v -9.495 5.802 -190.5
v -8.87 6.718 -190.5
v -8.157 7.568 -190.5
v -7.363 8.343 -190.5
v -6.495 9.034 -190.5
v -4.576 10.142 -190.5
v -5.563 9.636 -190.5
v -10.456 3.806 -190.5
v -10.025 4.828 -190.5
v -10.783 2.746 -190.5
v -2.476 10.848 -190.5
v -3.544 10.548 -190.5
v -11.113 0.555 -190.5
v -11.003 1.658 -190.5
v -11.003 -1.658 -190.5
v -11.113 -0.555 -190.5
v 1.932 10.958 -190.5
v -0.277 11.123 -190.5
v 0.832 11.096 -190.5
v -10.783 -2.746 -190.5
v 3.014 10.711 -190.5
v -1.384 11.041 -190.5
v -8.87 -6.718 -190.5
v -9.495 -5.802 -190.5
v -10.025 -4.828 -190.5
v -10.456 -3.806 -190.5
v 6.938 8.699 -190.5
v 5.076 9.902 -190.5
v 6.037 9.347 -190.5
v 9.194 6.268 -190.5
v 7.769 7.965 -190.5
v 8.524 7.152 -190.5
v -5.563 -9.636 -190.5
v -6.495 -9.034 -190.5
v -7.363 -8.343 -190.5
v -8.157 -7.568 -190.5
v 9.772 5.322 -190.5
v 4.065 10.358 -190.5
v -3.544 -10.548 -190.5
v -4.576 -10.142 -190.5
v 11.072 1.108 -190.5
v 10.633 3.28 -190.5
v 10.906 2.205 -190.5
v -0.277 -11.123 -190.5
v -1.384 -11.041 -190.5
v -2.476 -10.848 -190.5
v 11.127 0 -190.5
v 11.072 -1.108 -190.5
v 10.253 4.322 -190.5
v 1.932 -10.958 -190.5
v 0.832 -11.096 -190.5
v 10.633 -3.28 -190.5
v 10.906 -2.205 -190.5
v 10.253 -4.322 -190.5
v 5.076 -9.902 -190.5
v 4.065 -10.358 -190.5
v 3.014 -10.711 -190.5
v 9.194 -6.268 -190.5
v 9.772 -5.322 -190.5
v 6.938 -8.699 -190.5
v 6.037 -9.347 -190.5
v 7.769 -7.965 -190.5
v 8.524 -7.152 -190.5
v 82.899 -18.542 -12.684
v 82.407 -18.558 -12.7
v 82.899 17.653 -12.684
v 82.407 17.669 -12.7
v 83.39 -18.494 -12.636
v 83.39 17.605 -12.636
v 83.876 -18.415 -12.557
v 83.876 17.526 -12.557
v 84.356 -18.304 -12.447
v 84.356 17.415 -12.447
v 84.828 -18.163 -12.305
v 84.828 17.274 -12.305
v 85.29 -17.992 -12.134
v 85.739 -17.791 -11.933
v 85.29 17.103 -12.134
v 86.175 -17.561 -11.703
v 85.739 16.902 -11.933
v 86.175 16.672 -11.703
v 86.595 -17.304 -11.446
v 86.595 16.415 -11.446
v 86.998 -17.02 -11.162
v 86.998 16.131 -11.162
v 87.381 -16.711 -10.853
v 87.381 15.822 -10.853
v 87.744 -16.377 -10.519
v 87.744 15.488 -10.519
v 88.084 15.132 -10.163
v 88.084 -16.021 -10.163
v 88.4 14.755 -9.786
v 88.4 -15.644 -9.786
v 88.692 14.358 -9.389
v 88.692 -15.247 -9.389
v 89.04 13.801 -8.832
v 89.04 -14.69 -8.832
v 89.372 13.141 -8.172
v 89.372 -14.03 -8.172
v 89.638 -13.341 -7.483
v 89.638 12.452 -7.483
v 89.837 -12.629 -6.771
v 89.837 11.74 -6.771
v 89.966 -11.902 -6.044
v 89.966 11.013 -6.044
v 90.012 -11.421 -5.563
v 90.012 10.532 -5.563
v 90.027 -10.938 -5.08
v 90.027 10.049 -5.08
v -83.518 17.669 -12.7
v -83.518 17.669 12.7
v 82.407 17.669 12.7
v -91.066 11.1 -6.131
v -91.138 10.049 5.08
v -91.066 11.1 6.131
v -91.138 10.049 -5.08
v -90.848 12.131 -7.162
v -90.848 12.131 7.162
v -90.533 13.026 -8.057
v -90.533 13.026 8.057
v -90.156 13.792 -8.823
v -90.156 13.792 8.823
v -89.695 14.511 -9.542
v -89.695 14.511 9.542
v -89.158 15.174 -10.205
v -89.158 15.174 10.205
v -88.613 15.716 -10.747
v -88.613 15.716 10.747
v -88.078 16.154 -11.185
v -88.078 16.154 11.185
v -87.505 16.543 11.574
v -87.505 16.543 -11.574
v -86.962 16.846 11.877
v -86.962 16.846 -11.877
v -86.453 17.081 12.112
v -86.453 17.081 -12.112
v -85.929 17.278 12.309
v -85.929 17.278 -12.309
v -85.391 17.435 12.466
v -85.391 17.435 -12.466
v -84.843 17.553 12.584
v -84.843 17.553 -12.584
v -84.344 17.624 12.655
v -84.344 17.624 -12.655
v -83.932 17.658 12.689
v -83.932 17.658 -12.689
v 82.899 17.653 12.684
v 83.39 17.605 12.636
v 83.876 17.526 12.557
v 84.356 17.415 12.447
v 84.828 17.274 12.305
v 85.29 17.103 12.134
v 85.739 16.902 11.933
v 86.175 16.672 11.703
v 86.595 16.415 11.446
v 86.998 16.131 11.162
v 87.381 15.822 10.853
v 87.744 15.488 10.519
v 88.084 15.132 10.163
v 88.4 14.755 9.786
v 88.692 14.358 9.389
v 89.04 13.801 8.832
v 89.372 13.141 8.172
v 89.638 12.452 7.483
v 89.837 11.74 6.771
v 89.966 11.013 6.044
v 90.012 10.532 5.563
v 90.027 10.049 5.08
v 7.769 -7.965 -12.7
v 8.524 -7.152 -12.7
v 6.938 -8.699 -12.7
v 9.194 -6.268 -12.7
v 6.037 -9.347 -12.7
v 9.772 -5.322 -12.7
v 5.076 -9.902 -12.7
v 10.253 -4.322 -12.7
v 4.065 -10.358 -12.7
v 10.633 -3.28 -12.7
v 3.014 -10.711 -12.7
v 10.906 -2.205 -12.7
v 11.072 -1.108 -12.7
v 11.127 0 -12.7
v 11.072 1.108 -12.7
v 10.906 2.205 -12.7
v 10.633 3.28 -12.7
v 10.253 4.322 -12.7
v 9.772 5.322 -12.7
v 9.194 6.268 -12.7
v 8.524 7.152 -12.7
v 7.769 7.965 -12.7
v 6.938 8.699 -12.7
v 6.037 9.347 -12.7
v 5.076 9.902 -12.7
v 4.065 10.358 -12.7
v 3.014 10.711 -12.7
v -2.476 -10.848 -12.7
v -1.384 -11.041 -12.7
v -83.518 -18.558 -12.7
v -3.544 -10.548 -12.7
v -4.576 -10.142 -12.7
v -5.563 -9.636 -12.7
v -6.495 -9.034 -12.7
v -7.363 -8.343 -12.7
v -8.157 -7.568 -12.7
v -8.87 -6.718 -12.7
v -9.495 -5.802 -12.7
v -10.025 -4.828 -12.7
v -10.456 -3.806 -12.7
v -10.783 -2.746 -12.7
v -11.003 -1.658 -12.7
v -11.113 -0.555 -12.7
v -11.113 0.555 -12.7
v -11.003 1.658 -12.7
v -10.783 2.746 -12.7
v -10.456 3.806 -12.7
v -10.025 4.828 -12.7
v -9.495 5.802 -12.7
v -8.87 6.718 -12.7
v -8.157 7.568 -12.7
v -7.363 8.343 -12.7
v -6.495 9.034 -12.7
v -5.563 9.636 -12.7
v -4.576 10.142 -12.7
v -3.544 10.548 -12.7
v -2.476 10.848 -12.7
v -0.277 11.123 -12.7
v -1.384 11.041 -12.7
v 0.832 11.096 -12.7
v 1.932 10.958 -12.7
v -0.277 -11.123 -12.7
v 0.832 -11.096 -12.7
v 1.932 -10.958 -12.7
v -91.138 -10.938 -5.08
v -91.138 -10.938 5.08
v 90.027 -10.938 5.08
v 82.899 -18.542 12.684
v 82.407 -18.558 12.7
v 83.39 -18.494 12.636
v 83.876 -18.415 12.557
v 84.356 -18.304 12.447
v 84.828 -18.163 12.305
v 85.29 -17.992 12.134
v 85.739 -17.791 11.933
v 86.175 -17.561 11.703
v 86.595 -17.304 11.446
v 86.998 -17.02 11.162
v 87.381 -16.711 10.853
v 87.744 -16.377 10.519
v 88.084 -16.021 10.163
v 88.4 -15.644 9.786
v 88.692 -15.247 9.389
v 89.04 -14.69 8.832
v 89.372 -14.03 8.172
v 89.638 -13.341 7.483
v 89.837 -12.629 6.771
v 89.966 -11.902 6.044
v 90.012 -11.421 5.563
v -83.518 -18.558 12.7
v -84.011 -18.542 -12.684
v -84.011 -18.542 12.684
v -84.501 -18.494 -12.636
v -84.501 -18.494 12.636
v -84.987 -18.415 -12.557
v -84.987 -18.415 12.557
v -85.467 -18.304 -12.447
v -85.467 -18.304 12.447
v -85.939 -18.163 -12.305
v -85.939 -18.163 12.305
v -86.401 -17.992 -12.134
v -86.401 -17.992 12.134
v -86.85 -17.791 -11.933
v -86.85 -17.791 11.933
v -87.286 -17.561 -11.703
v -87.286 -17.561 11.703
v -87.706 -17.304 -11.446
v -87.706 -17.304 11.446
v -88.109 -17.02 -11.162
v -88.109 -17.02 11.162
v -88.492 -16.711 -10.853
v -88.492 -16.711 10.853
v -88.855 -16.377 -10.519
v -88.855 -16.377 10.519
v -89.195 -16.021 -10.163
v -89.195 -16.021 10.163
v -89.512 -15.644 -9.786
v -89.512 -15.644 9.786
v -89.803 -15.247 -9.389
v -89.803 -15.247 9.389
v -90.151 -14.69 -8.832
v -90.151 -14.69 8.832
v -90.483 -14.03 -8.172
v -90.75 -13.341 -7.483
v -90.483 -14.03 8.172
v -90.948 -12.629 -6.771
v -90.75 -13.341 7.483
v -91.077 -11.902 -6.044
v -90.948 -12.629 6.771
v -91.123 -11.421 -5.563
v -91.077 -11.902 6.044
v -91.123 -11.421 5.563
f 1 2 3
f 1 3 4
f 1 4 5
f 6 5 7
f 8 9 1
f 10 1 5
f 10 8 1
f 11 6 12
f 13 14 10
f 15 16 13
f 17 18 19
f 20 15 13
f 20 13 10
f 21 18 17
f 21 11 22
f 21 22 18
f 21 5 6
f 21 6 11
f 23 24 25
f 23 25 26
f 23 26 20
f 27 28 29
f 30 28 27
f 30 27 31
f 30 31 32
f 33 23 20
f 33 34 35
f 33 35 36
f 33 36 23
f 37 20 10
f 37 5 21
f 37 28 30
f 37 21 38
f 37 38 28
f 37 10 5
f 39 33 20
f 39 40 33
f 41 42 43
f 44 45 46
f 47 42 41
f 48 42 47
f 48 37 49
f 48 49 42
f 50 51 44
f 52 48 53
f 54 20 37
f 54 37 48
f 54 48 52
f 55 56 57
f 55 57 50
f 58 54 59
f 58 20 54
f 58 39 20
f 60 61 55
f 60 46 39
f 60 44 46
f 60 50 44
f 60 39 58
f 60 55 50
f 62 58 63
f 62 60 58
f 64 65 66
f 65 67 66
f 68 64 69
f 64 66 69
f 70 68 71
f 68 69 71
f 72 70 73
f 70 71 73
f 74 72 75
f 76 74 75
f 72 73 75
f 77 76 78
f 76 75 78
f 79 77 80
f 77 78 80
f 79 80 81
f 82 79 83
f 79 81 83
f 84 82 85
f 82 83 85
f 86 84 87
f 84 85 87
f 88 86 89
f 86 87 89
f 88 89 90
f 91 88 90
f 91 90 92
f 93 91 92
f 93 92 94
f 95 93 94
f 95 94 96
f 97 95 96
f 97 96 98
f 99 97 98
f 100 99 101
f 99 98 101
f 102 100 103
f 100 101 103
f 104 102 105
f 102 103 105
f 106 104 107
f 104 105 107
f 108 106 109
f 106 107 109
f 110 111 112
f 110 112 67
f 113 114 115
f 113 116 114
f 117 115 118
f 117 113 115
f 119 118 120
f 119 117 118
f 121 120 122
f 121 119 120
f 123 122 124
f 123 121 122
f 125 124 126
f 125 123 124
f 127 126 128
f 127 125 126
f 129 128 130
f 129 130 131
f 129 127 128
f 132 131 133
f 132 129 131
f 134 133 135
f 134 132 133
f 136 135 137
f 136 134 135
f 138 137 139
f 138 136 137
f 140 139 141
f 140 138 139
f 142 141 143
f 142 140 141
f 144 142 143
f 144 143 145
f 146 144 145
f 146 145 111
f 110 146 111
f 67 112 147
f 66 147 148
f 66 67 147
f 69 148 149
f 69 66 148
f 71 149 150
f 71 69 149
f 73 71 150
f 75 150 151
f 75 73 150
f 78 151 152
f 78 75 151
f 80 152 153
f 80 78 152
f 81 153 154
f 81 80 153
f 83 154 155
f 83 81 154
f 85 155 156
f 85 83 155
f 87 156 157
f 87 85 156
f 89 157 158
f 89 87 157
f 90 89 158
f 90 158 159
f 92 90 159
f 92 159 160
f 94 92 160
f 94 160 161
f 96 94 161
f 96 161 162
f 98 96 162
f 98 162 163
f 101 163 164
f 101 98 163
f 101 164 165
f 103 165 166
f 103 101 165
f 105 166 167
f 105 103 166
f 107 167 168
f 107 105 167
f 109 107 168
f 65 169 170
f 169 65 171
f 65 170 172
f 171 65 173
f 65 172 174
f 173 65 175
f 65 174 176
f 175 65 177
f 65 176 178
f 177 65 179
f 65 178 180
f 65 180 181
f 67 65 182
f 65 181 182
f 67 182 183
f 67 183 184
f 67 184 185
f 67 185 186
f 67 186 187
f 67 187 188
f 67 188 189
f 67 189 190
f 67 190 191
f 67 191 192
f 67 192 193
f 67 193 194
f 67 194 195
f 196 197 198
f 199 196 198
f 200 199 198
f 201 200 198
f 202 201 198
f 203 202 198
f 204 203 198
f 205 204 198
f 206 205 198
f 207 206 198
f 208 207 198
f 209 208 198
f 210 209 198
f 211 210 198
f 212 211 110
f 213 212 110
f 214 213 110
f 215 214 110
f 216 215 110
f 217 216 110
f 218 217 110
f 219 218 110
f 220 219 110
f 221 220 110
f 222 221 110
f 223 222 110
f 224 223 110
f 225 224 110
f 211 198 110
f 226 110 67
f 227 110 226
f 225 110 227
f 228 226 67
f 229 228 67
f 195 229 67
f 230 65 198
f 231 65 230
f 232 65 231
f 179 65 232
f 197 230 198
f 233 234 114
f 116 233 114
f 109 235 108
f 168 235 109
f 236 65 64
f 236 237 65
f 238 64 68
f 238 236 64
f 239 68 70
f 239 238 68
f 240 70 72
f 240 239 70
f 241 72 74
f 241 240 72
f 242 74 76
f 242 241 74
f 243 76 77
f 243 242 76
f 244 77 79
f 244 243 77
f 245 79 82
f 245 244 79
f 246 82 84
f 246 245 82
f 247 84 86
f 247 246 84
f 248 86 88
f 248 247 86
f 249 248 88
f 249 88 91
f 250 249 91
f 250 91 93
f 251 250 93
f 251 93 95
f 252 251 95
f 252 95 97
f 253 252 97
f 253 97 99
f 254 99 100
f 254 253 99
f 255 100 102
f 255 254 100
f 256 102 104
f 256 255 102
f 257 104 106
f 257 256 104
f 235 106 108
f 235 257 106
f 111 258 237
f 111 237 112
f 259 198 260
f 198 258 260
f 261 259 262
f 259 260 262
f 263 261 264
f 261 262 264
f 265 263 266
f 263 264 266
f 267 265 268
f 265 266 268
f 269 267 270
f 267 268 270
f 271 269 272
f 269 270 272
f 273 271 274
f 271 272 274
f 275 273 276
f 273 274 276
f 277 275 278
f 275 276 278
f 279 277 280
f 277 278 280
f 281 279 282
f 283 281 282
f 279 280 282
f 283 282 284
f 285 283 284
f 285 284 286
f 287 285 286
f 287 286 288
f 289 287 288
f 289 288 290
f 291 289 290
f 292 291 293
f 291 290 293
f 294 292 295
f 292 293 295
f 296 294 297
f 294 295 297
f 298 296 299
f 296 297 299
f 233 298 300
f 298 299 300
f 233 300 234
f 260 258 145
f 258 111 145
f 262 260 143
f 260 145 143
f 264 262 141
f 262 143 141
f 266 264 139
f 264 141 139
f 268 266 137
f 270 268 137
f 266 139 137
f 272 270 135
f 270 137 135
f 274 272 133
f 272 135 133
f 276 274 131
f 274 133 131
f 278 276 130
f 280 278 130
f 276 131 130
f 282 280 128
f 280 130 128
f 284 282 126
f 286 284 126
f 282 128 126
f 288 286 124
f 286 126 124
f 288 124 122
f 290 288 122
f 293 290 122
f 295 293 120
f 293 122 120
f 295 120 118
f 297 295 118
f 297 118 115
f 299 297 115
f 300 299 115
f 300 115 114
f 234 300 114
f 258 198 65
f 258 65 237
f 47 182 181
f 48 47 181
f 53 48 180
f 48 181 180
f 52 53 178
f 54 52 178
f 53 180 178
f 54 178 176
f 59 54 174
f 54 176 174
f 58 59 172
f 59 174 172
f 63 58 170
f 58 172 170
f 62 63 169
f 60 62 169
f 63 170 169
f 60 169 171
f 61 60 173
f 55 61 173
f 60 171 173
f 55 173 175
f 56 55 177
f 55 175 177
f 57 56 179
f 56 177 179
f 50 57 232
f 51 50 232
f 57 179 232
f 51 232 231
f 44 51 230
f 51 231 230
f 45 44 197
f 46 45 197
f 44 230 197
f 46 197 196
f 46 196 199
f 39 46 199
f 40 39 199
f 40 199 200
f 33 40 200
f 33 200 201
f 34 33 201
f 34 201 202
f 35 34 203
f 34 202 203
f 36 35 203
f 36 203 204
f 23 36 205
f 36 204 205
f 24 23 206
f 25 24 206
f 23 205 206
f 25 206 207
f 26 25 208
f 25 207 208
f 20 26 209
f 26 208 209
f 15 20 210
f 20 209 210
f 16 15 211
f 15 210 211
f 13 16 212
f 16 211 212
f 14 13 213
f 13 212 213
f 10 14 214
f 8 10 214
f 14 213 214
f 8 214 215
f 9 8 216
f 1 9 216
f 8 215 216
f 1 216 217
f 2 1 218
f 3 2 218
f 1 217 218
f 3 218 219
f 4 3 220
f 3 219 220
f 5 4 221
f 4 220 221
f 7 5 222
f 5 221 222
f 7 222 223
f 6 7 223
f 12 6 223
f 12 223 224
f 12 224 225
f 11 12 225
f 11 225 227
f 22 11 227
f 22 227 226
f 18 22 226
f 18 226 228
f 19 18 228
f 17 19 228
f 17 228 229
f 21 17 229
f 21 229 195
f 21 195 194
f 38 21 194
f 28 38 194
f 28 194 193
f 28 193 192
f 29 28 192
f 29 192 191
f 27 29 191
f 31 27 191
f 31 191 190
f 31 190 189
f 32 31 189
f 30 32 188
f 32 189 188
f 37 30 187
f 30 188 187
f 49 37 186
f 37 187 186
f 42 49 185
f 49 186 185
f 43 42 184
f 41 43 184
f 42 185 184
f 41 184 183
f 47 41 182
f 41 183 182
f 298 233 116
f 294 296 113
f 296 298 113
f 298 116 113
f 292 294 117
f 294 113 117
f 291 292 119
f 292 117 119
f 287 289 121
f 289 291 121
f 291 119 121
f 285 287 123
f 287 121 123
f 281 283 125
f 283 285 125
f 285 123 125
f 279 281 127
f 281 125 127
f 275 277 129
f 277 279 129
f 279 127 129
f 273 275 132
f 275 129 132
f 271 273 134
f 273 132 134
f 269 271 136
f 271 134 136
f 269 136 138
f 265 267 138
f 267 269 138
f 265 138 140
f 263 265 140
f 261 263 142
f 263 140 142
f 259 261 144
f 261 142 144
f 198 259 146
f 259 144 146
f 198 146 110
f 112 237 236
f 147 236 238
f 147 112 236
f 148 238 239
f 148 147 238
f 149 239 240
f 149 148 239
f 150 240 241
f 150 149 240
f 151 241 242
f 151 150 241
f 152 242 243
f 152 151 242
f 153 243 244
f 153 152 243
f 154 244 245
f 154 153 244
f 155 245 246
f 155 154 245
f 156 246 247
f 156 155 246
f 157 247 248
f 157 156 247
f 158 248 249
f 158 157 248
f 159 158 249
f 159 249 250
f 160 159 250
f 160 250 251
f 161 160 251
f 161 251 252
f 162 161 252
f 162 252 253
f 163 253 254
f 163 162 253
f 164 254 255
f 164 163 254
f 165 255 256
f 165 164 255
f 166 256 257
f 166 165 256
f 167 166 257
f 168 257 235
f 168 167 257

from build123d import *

# Parameters (mm, degrees)
F0_W     = 79.5655027032
F0_H     = 36.2267494202
F1_DEPTH = 12.7
F2_DEPTH = 12.7
F3_R     = 11.1269376105
F4_DEPTH = 177.8
F5_DEPTH = 50.8
F6_DEPTH = 50.8
F7_R     = 7.62
F8_R     = 7.62


with BuildPart() as f1:
    # F0 (on Top) → F1 (new body)
    with BuildSketch(Plane.XY):
        with Locations((-0.5556233227, -0.4444997758)):
            Rectangle(F0_W, F0_H)
    extrude(amount=F1_DEPTH)

    # F2 (add): a face of the model
    f2_faces = [f1.faces().sort_by_distance(p)[0] for p in [
        (-0.5556233227, -0.4444997758, 0),
    ]]
    extrude(f2_faces, amount=F2_DEPTH)

    # F3 (on face) → F4 (join)
    with BuildSketch(Plane(origin=(0, 0, -12.7), x_dir=(1, 0, 0), z_dir=(0, 0, -1))):
        Circle(F3_R)
    extrude(amount=F4_DEPTH)

    # F5 (add): a face of the model
    f5_faces = [f1.faces().sort_by_distance(p)[0] for p in [
        (-40.3383746743, -0.4444997758, 0),
    ]]
    extrude(f5_faces, amount=F5_DEPTH)

    # F6 (add): a face of the model
    f6_faces = [f1.faces().sort_by_distance(p)[0] for p in [
        (39.2271280289, -0.4444997758, 0),
    ]]
    extrude(f6_faces, amount=F6_DEPTH)

    # F7
    f7_edges = [f1.edges().sort_by_distance(p)[0] for p in [
        (90.027128, -0.4445, 12.7),
        (90.027128, 17.668875, 0),
        (90.027128, -0.4445, -12.7),
        (90.027128, -18.557874, 0),
    ]]
    fillet(f7_edges, radius=F7_R)

    # F8
    f8_edges = [f1.edges().sort_by_distance(p)[0] for p in [
        (-91.138375, 17.668875, 0),
        (-91.138375, -0.4445, 12.7),
        (-91.138375, -18.557874, 0),
        (-91.138375, -0.4445, -12.7),
    ]]
    fillet(f8_edges, radius=F8_R)


solid = f1.part
